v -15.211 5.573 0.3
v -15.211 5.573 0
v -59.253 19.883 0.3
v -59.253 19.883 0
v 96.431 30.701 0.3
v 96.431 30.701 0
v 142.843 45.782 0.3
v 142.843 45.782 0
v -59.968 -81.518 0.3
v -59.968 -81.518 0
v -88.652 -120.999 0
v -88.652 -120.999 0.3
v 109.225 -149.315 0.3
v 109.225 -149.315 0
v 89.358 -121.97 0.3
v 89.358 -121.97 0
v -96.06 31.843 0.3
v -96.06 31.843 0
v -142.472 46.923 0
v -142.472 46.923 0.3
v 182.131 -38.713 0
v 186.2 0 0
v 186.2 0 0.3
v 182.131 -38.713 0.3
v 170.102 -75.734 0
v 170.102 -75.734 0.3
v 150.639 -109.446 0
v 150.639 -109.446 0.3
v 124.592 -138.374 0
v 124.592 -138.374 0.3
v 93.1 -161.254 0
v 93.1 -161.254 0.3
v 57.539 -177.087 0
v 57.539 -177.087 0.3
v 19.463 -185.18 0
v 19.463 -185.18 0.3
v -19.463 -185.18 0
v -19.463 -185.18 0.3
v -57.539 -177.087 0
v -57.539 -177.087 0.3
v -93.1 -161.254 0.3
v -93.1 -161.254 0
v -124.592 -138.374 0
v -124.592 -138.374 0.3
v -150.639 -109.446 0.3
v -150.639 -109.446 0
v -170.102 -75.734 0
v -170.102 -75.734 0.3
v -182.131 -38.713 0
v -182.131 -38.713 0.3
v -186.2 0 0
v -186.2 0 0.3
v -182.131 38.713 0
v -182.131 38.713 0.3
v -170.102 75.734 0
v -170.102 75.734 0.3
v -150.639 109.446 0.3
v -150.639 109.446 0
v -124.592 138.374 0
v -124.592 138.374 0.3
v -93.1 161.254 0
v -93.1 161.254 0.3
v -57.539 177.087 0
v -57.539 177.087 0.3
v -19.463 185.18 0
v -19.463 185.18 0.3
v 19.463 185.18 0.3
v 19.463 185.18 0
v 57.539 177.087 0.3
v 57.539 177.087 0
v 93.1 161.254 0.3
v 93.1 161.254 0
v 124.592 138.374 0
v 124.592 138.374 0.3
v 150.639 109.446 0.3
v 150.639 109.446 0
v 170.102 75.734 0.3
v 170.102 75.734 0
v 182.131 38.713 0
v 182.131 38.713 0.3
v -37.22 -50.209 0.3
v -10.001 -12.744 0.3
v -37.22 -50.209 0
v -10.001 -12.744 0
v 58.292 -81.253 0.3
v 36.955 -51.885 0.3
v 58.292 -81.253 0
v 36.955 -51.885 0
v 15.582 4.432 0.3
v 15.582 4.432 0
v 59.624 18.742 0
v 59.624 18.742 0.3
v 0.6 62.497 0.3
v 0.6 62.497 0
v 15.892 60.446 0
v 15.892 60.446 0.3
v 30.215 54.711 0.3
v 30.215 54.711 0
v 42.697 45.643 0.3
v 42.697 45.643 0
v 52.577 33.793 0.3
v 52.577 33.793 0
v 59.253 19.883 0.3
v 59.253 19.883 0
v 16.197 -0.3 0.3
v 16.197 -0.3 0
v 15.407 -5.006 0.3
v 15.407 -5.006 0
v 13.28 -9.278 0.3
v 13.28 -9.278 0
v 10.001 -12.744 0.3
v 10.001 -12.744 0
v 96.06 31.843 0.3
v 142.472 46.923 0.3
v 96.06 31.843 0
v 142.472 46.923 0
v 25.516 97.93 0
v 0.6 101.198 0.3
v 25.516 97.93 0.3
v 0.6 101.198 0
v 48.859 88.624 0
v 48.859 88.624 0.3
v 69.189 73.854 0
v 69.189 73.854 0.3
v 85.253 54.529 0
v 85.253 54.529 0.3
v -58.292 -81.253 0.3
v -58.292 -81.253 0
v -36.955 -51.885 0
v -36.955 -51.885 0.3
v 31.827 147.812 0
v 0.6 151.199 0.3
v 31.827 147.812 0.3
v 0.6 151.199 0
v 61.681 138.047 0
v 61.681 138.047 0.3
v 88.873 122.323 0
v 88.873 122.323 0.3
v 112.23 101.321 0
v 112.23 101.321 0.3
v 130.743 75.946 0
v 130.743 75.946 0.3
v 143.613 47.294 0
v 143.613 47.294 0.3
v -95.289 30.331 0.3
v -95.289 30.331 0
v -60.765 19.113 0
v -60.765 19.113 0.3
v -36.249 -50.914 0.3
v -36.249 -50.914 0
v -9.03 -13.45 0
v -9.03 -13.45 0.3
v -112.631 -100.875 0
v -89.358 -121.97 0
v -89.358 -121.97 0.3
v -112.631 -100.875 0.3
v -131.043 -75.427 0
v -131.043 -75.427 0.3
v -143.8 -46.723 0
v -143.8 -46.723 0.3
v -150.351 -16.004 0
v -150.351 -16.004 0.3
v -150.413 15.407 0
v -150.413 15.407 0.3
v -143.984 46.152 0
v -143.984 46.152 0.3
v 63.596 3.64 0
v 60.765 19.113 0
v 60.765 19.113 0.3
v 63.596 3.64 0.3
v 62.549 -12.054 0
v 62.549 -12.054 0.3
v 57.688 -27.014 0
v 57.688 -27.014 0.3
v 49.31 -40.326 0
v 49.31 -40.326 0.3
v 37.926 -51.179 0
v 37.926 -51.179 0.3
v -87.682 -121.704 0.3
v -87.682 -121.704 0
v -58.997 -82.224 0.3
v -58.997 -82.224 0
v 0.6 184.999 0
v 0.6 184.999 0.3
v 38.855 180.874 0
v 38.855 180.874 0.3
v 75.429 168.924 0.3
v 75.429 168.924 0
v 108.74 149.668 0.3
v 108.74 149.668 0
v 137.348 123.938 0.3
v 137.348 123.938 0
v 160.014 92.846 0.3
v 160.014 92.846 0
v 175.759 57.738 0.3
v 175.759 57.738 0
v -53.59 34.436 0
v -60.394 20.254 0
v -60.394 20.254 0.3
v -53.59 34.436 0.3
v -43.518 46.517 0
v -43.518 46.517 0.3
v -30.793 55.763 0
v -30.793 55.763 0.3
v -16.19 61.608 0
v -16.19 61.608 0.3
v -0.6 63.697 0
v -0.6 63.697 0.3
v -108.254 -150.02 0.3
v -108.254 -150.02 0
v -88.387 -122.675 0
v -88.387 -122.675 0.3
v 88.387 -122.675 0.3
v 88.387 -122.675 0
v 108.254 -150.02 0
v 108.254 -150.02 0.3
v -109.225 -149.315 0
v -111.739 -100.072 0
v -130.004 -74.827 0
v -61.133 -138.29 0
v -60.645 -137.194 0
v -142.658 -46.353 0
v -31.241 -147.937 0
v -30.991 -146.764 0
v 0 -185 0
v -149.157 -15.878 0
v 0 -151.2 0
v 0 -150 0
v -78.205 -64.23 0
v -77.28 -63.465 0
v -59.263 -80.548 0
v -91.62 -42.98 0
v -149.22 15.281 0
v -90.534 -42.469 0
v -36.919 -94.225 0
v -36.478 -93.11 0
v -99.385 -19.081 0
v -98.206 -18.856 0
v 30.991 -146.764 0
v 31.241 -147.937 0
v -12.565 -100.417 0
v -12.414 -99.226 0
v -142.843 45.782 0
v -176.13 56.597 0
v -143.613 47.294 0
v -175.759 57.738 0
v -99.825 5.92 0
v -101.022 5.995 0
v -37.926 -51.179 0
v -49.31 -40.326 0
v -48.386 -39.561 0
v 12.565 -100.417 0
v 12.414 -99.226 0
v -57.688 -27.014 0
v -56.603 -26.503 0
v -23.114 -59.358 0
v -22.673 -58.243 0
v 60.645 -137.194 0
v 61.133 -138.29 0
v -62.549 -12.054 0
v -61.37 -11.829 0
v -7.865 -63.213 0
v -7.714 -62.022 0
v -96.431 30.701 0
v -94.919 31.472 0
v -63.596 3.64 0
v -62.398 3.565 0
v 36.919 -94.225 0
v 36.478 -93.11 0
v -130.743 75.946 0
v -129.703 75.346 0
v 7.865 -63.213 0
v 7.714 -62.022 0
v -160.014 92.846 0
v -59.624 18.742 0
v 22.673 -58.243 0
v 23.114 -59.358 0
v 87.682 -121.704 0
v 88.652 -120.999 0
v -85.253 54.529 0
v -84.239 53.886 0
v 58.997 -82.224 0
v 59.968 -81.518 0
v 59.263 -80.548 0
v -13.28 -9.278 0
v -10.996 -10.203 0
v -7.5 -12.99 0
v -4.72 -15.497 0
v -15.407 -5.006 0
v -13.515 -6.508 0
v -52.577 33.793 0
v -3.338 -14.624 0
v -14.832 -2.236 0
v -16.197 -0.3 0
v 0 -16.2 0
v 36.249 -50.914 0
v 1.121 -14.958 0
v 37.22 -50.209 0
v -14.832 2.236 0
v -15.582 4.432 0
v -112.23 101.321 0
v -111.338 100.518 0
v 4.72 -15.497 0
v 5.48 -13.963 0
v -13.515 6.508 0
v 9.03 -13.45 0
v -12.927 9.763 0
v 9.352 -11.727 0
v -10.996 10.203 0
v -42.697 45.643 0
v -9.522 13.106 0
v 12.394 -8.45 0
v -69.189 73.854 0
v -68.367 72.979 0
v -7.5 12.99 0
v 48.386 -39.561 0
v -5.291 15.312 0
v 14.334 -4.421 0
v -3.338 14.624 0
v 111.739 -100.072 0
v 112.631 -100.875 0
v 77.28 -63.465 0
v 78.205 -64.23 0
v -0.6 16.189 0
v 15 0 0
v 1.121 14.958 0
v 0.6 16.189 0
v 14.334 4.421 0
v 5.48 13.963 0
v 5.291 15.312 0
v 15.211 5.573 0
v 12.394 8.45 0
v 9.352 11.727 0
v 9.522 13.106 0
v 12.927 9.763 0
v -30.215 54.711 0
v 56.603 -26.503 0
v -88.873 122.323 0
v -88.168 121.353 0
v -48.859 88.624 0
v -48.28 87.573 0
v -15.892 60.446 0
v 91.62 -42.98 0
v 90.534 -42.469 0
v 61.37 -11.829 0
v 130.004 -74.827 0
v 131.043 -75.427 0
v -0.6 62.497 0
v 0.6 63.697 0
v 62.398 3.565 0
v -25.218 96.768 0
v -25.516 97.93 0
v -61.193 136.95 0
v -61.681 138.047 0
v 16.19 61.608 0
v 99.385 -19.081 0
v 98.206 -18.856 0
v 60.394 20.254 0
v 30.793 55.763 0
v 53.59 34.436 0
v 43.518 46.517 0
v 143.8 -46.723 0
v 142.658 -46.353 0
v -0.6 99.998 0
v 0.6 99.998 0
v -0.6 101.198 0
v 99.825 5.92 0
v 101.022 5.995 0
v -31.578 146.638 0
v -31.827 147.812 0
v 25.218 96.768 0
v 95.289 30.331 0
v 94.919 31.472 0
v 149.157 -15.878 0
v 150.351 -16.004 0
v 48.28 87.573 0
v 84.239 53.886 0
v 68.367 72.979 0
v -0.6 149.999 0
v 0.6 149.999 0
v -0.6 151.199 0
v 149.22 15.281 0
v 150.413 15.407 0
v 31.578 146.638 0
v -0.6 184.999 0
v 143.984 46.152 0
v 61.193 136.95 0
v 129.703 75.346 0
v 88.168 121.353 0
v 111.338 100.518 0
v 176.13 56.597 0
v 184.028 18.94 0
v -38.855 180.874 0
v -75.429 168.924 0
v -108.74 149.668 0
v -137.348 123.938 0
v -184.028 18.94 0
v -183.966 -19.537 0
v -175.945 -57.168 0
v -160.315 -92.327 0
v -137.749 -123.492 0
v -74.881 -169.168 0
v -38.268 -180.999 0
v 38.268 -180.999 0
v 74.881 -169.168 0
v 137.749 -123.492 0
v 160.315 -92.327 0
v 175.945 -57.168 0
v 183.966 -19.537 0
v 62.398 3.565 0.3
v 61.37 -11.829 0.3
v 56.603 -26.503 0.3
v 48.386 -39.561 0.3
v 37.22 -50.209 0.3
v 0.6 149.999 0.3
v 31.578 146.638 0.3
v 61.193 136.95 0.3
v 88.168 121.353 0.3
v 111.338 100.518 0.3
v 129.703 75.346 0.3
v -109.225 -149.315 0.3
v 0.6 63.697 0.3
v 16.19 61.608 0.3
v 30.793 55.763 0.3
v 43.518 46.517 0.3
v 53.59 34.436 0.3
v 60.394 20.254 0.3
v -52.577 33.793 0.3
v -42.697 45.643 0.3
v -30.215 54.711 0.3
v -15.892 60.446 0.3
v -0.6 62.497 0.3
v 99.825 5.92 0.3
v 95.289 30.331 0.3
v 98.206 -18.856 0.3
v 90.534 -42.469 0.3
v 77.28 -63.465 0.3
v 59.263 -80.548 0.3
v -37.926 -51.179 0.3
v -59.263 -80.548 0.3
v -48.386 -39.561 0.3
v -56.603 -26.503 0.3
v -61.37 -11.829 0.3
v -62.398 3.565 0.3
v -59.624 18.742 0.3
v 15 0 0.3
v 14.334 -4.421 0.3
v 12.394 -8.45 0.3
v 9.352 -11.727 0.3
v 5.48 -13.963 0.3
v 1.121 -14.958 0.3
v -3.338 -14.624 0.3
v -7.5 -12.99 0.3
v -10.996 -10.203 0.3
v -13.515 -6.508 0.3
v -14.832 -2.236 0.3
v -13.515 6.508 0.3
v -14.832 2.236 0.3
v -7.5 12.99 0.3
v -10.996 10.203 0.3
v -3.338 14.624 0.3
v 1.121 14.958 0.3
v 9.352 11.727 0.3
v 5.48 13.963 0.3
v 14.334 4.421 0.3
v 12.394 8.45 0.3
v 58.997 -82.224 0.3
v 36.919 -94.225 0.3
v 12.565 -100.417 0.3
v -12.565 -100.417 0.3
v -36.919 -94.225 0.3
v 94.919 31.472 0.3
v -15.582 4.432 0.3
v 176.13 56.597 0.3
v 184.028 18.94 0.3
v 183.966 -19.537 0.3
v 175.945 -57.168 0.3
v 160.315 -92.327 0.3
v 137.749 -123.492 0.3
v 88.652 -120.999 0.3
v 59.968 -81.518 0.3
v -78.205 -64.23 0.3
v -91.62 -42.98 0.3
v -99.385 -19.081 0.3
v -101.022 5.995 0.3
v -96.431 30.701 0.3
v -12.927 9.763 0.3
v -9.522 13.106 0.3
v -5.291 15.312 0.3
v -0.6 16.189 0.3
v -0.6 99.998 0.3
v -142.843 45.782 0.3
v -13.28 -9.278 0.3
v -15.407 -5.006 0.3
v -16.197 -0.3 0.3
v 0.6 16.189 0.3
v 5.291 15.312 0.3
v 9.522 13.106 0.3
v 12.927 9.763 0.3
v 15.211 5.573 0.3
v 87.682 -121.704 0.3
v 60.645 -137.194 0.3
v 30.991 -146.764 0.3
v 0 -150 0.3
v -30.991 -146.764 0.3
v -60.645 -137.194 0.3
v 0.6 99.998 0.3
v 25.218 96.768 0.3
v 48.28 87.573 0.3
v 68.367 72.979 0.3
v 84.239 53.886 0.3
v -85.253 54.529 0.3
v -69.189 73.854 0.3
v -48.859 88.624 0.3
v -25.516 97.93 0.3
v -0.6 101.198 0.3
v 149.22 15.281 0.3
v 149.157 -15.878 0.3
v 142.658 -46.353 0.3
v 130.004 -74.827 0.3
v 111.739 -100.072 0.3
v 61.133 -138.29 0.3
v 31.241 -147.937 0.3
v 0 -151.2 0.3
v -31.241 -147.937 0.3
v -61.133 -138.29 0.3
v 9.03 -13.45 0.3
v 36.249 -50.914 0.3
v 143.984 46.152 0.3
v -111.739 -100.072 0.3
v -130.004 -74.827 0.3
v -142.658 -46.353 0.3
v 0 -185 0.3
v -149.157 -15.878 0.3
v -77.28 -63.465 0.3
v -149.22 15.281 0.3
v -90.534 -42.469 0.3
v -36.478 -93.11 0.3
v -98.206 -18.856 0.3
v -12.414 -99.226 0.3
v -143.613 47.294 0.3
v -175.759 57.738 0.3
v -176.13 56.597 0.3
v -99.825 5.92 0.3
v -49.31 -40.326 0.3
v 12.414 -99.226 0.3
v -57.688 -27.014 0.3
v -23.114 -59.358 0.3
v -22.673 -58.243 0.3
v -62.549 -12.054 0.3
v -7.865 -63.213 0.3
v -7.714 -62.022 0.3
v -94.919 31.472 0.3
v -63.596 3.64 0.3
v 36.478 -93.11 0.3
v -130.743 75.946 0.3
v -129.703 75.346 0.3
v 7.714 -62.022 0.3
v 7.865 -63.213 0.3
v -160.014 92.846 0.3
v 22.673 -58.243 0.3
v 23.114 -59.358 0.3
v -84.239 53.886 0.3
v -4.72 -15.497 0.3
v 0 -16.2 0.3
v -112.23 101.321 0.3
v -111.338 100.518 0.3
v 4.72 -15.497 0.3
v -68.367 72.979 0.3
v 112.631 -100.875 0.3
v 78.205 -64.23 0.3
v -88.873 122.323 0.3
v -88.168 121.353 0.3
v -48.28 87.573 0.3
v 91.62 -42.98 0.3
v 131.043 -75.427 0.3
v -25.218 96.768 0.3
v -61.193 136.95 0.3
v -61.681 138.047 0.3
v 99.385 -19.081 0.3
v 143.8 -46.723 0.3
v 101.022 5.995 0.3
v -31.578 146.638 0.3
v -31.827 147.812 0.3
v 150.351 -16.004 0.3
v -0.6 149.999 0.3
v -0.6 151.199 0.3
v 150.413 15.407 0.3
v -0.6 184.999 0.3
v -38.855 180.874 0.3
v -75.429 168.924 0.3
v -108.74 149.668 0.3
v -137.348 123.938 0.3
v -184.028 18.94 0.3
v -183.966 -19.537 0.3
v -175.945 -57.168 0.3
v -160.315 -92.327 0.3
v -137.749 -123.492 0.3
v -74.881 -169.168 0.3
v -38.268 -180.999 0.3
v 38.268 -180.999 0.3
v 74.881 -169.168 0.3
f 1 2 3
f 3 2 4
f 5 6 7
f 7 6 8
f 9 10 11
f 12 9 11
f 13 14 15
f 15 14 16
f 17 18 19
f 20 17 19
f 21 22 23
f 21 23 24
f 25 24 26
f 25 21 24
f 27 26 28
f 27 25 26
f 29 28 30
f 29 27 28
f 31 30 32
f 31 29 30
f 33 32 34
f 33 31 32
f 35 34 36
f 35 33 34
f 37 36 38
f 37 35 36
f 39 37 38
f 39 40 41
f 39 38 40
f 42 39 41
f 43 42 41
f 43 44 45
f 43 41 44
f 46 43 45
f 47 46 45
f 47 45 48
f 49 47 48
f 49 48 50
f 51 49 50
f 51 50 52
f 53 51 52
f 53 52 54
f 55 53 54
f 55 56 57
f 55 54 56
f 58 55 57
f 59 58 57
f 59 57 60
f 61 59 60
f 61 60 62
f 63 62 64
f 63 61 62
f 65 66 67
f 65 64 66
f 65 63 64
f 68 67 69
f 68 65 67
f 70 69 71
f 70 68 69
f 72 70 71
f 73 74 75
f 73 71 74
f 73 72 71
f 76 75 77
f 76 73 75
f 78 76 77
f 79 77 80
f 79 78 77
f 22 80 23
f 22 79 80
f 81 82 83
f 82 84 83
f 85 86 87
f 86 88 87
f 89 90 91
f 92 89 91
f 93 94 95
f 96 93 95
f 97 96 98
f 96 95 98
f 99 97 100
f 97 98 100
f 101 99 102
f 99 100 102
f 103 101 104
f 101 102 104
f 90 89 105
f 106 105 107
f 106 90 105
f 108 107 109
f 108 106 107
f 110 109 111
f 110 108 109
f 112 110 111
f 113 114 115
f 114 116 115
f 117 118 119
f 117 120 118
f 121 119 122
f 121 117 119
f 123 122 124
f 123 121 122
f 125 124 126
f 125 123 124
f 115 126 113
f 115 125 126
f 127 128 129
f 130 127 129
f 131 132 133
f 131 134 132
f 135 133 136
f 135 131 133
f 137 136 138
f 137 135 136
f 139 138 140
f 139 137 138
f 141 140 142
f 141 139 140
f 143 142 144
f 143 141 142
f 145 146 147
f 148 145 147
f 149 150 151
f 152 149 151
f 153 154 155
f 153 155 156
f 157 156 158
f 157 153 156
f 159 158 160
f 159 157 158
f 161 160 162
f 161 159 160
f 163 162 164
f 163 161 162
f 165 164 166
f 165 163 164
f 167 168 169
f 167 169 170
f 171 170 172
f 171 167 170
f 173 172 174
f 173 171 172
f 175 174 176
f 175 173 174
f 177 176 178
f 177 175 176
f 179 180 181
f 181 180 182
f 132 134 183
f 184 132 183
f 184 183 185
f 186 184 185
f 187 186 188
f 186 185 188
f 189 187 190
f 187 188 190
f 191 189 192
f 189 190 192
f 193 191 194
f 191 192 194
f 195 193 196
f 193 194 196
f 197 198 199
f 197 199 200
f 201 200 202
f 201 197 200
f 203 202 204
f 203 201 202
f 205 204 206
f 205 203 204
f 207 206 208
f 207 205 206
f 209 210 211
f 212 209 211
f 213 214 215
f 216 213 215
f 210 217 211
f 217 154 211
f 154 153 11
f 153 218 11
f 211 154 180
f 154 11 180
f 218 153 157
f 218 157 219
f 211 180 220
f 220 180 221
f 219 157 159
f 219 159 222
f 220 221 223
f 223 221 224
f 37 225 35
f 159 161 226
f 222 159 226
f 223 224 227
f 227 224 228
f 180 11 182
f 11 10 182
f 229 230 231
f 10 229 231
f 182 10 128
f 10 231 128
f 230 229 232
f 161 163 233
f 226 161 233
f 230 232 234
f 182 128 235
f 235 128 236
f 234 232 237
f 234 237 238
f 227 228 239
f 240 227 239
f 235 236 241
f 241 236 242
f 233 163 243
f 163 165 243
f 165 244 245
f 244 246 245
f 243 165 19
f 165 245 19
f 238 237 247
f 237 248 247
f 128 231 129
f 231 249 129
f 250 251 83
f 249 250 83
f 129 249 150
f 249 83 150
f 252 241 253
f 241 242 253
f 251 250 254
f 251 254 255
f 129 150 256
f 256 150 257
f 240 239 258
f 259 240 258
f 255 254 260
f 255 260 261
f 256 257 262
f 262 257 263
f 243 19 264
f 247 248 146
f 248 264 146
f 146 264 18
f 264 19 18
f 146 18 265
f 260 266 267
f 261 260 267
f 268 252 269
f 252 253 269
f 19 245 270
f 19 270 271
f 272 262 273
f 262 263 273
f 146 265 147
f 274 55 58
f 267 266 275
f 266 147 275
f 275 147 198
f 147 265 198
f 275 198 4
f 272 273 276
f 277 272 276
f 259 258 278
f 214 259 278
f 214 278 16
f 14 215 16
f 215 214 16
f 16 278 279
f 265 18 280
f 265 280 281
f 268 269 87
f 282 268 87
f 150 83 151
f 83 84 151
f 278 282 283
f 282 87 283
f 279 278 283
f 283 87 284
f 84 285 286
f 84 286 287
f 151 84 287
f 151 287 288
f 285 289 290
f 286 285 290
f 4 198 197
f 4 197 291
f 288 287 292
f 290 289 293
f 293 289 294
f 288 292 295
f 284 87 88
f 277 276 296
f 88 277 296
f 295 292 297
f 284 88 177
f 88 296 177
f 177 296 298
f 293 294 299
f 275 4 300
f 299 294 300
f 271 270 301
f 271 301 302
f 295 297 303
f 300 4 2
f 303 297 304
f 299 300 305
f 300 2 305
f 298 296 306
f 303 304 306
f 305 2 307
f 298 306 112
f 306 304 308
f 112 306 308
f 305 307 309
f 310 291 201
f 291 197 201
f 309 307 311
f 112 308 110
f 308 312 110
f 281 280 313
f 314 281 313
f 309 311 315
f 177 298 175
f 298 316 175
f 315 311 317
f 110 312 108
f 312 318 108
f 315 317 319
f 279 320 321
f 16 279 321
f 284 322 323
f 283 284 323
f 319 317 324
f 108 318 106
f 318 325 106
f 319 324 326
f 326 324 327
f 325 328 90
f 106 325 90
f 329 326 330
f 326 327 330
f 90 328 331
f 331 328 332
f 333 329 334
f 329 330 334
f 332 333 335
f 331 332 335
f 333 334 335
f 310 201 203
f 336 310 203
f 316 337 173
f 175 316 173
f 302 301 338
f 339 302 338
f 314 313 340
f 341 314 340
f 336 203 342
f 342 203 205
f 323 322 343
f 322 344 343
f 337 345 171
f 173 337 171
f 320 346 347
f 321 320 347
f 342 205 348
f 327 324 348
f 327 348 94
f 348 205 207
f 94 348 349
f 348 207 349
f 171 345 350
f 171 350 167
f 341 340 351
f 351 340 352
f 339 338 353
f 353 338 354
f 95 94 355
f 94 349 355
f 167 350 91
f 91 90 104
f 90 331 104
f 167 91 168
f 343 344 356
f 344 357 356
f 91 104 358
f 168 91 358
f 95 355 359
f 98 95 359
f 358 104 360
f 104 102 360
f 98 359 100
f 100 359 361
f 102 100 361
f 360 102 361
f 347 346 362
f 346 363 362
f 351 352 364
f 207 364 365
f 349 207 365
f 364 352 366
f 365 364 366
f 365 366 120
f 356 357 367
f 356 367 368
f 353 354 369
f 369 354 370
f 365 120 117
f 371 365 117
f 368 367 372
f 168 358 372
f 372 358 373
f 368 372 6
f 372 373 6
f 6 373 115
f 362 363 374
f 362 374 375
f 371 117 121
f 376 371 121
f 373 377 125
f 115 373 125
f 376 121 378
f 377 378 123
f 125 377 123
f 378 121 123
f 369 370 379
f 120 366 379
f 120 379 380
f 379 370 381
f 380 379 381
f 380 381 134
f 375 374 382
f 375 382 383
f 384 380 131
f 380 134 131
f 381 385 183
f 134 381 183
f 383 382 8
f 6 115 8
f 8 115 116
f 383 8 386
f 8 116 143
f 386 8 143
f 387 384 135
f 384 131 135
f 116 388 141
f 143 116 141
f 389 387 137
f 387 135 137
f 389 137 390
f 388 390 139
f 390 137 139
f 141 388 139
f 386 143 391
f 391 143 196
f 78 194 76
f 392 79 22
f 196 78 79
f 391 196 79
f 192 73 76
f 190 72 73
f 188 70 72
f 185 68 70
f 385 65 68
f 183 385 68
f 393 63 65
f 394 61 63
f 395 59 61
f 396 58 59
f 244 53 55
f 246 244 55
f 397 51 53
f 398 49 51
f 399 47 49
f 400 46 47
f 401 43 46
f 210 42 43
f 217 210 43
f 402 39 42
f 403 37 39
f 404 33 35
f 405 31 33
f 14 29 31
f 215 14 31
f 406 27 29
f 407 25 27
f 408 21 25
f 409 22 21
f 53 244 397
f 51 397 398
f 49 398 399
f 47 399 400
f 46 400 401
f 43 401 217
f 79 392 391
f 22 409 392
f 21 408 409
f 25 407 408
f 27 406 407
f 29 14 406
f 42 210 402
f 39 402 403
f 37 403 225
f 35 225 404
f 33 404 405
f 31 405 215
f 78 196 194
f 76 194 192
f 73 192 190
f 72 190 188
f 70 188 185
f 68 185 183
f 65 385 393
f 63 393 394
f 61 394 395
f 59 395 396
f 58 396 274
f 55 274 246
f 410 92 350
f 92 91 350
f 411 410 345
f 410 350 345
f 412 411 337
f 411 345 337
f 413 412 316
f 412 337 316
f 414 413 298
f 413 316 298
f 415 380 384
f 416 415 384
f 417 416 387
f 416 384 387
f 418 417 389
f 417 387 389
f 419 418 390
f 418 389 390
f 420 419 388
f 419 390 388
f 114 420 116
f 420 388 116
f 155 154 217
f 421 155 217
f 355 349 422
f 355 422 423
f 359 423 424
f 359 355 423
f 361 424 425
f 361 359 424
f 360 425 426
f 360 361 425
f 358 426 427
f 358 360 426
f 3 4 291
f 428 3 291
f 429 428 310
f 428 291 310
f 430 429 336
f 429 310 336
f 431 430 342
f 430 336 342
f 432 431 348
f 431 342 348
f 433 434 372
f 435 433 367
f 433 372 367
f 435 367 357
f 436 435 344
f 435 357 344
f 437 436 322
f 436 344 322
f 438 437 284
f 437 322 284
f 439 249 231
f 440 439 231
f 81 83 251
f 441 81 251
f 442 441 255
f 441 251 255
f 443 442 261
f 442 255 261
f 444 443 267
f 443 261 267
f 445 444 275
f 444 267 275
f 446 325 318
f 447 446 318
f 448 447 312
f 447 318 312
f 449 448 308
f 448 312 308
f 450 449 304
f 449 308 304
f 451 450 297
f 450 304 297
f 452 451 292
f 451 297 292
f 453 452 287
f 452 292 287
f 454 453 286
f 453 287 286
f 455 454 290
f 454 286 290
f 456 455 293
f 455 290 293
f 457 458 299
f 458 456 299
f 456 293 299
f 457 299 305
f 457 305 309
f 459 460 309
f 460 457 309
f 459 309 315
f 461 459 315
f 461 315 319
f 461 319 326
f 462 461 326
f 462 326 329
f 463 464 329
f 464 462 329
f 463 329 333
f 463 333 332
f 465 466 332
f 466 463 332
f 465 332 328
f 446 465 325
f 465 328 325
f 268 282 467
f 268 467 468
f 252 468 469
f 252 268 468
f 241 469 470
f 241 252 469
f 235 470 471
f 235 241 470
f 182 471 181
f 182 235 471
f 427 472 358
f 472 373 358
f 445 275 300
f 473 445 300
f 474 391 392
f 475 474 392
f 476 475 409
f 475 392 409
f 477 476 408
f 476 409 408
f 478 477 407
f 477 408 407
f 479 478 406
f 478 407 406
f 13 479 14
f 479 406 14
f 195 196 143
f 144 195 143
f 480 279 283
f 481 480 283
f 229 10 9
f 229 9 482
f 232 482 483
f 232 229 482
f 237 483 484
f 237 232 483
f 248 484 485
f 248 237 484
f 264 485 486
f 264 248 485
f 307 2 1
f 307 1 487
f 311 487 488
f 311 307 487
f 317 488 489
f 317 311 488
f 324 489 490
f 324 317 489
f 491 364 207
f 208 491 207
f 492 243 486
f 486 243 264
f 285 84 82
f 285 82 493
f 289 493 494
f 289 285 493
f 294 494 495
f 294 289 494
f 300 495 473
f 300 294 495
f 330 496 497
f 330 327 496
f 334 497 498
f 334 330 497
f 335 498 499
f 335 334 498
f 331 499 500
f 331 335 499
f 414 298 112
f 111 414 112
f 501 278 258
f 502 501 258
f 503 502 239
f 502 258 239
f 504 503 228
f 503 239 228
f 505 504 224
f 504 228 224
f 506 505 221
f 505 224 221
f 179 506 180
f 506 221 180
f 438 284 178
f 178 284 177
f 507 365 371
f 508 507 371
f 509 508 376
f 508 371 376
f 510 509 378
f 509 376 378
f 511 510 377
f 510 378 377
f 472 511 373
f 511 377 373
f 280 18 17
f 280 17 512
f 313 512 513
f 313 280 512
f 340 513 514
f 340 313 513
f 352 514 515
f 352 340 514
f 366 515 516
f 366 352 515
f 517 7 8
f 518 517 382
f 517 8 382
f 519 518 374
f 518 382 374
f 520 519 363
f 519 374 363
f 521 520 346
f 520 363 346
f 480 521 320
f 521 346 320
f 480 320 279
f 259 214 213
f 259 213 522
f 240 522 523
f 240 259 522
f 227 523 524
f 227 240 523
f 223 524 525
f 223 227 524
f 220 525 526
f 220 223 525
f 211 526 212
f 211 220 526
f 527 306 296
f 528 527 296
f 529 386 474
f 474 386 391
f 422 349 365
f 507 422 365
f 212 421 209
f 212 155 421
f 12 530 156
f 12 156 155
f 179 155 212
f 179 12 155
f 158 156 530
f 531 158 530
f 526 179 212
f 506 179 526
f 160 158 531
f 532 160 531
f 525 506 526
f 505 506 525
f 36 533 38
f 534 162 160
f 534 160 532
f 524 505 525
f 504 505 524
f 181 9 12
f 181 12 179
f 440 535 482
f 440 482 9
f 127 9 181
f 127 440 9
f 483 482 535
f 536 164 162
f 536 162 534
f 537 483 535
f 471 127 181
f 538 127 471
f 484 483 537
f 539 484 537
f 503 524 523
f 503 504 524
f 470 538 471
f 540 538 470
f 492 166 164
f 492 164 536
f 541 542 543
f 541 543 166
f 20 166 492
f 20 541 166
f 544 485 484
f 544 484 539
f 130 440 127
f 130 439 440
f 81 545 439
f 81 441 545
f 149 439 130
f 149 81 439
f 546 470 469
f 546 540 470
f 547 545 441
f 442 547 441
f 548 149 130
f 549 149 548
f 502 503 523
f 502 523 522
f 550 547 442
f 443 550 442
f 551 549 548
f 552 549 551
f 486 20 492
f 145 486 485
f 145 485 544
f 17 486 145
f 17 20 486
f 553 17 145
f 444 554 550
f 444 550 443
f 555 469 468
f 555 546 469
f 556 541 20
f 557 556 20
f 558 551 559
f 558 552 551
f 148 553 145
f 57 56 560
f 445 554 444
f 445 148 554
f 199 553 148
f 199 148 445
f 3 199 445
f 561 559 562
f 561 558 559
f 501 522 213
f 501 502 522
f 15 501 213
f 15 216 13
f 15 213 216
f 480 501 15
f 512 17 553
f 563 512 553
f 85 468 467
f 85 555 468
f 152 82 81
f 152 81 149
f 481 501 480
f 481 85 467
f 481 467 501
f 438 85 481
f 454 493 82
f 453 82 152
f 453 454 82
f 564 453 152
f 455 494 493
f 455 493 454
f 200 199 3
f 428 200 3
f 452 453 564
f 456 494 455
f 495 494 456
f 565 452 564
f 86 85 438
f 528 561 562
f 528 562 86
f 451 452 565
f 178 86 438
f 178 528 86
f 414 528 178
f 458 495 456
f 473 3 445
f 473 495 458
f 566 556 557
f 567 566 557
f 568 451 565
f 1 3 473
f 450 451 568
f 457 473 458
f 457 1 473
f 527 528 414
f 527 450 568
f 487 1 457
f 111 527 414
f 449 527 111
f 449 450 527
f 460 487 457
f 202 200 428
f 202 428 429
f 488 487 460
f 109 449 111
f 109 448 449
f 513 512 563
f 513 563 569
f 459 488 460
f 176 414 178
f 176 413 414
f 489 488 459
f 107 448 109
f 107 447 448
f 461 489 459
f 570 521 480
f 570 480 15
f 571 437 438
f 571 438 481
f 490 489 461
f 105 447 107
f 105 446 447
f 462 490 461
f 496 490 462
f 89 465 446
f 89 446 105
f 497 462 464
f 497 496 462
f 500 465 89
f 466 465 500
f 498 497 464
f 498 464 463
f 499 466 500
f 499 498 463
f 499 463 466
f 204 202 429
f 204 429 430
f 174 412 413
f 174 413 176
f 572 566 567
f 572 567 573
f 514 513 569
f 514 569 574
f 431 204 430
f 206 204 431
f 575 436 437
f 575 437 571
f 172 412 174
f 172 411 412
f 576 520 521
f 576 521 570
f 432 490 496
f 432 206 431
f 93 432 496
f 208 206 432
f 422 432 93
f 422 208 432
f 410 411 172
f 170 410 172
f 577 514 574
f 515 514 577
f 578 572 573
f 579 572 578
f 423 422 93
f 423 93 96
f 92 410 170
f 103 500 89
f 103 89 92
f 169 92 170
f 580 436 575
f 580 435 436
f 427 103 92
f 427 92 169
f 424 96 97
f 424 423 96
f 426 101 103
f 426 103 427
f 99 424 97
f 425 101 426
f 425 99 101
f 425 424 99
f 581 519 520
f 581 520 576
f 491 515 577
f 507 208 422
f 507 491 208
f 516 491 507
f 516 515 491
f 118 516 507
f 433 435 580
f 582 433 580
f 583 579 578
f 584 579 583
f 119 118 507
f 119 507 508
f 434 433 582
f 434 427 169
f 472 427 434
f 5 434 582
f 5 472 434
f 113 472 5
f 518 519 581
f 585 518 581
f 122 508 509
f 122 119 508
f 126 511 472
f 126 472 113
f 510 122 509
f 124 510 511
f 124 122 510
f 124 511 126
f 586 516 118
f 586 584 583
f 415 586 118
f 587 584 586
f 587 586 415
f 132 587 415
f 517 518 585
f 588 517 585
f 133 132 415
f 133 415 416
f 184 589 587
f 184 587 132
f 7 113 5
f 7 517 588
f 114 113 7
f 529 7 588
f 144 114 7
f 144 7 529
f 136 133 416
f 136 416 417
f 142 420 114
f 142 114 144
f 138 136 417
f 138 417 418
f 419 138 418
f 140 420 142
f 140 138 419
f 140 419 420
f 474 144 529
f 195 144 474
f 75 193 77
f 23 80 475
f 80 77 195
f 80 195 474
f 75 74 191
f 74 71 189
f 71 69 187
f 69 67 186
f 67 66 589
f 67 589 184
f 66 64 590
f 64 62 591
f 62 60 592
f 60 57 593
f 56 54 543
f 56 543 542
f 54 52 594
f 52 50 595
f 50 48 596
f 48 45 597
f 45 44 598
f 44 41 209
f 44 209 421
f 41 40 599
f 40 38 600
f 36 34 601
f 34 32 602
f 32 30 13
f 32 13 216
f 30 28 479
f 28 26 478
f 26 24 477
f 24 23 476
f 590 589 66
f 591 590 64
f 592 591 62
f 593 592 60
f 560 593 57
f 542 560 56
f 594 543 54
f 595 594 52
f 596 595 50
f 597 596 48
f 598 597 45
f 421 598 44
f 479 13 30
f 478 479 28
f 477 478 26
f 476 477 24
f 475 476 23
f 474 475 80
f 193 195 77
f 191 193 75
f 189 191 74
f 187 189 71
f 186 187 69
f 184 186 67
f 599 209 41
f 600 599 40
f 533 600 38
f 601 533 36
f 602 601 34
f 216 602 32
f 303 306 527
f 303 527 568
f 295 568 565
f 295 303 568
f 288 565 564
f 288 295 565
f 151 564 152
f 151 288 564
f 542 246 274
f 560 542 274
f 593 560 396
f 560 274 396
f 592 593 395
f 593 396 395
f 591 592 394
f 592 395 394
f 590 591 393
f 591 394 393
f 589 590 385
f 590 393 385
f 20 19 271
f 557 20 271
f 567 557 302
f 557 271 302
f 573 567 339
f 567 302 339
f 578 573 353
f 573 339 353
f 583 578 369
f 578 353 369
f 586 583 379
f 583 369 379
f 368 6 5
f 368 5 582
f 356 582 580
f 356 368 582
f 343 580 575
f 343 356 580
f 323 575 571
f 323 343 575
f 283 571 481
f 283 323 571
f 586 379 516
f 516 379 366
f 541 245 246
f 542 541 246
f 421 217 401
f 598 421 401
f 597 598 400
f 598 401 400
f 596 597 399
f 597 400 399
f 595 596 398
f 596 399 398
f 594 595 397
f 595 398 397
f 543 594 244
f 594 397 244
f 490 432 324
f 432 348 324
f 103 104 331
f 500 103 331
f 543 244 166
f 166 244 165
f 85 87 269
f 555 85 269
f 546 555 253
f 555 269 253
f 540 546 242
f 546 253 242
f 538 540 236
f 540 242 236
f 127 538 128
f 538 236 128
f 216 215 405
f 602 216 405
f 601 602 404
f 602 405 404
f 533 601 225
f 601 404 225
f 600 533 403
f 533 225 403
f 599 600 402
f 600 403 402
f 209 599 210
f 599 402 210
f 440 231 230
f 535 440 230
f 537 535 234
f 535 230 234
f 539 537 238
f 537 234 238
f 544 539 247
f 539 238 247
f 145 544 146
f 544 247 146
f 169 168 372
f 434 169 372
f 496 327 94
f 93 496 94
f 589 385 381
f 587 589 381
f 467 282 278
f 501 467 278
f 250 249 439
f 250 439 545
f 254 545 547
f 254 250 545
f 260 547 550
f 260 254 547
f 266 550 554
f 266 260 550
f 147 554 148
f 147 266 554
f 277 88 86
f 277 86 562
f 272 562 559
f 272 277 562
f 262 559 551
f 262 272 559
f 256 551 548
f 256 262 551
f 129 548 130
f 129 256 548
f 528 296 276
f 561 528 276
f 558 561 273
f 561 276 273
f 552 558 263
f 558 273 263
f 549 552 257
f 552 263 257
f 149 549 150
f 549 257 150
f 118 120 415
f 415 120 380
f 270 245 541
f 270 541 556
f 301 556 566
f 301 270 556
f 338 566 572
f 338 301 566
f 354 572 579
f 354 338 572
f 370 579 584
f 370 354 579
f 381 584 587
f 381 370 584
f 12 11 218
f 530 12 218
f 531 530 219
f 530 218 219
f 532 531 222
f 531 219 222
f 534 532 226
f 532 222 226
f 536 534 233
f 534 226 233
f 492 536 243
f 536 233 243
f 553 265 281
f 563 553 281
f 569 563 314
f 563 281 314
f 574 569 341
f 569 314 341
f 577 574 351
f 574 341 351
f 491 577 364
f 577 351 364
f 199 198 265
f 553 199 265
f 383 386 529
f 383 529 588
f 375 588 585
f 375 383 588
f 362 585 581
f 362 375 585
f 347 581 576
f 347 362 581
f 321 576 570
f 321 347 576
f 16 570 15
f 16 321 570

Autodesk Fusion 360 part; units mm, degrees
sketch "Sketch1" plane through (0, 0, 0) normal (0, 0, 1) x (1, 0, 0)
  circle A0 centre (0, 0) radius 185
  circle A1 centre (0, 0) radius 186.2
  circle A2 centre (0, 0) radius 150
  circle A3 centre (0, 0) radius 100
  circle A4 centre (0, 0) radius 62.5
  circle A5 centre (0, 0) radius 15
  circle A6 centre (0, 0) radius 151.2
  circle A7 centre (0, 0) radius 101.2
  circle A8 centre (0, 0) radius 63.7
  circle A9 centre (0, 0) radius 16.2
  line L0 (0, 0) -> (0, 186.2) construction
  line L1 (-0.6, 184.999) -> (-0.6, 16.1889)
  line L2 (0.6, 16.1889) -> (0.6, 184.999)
  line L3 (-15.2111, 5.5733) -> (-175.7591, 57.7385)
  line L4 (-176.1299, 56.5972) -> (-15.582, 4.432)
  line L5 (-10.001, -12.7444) -> (-109.2251, -149.3147)
  line L6 (-108.2543, -150.02) -> (-9.0302, -13.4498)
  line L7 (9.0302, -13.4498) -> (108.2543, -150.02)
  line L8 (109.2251, -149.3147) -> (10.001, -12.7444)
  line L9 (15.582, 4.432) -> (176.1299, 56.5972)
  line L10 (175.7591, 57.7385) -> (15.2111, 5.5733)
  dimension "d1" = 370
  dimension "d2" = 1.2
  dimension "d3" = 300
  dimension "d4" = 200
  dimension "d5" = 125
  dimension "d6" = 30
  dimension "d7" = 1.2
  dimension "d8" = 1.2
  dimension "d9" = 1.2
  dimension "d10" = 1.2
  dimension "d11" = 1.2
  dimension "d13" = 360
extrude "Extrude1" add sketch "Sketch1" along normal blind 0.3 contours A0 A6 L9 L10 | A0 A6 L7 L8 | A2 A6 L9 L10 | A2 A6 L8 L9 | A2 A6 L7 L8 | A0 A6 L1 L2 | A2 A6 L2 L10 | A2 A7 L9 L10 | A0 A6 L5 L6 | A2 A6 L6 L7 | A2 A7 L7 L8 | A2 A6 L1 L2 | A3 A7 L9 L10 | A3 A7 L8 L9 | A2 A6 L5 L6 | A3 A7 L7 L8 | A0 A6 L3 L4 | A2 A6 L1 L3 | A2 A7 L1 L2 | A3 A7 L2 L10 | A3 A8 L9 L10 | A2 A6 L4 L5 | A2 A7 L5 L6 | A3 A7 L6 L7 | A3 A8 L7 L8 | A2 A6 L3 L4 | A3 A7 L1 L2 | A4 A8 L9 L10 | A4 A8 L8 L9 | A3 A7 L5 L6 | A4 A8 L7 L8 | A2 A7 L3 L4 | A3 A7 L1 L3 | A3 A8 L1 L2 | A4 A8 L2 L10 | A4 A9 L9 L10 | A3 A7 L4 L5 | A3 A8 L5 L6 | A4 A8 L6 L7 | A4 A9 L7 L8 | A3 A7 L3 L4 | A4 A8 L1 L2 | A9 | A4 A8 L5 L6 | A3 A8 L3 L4 | A4 A8 L1 L3 | A4 A9 L1 L2 | A4 A8 L4 L5 | A4 A9 L5 L6 | A4 A8 L3 L4 | A4 A9 L3 L4 | A1
